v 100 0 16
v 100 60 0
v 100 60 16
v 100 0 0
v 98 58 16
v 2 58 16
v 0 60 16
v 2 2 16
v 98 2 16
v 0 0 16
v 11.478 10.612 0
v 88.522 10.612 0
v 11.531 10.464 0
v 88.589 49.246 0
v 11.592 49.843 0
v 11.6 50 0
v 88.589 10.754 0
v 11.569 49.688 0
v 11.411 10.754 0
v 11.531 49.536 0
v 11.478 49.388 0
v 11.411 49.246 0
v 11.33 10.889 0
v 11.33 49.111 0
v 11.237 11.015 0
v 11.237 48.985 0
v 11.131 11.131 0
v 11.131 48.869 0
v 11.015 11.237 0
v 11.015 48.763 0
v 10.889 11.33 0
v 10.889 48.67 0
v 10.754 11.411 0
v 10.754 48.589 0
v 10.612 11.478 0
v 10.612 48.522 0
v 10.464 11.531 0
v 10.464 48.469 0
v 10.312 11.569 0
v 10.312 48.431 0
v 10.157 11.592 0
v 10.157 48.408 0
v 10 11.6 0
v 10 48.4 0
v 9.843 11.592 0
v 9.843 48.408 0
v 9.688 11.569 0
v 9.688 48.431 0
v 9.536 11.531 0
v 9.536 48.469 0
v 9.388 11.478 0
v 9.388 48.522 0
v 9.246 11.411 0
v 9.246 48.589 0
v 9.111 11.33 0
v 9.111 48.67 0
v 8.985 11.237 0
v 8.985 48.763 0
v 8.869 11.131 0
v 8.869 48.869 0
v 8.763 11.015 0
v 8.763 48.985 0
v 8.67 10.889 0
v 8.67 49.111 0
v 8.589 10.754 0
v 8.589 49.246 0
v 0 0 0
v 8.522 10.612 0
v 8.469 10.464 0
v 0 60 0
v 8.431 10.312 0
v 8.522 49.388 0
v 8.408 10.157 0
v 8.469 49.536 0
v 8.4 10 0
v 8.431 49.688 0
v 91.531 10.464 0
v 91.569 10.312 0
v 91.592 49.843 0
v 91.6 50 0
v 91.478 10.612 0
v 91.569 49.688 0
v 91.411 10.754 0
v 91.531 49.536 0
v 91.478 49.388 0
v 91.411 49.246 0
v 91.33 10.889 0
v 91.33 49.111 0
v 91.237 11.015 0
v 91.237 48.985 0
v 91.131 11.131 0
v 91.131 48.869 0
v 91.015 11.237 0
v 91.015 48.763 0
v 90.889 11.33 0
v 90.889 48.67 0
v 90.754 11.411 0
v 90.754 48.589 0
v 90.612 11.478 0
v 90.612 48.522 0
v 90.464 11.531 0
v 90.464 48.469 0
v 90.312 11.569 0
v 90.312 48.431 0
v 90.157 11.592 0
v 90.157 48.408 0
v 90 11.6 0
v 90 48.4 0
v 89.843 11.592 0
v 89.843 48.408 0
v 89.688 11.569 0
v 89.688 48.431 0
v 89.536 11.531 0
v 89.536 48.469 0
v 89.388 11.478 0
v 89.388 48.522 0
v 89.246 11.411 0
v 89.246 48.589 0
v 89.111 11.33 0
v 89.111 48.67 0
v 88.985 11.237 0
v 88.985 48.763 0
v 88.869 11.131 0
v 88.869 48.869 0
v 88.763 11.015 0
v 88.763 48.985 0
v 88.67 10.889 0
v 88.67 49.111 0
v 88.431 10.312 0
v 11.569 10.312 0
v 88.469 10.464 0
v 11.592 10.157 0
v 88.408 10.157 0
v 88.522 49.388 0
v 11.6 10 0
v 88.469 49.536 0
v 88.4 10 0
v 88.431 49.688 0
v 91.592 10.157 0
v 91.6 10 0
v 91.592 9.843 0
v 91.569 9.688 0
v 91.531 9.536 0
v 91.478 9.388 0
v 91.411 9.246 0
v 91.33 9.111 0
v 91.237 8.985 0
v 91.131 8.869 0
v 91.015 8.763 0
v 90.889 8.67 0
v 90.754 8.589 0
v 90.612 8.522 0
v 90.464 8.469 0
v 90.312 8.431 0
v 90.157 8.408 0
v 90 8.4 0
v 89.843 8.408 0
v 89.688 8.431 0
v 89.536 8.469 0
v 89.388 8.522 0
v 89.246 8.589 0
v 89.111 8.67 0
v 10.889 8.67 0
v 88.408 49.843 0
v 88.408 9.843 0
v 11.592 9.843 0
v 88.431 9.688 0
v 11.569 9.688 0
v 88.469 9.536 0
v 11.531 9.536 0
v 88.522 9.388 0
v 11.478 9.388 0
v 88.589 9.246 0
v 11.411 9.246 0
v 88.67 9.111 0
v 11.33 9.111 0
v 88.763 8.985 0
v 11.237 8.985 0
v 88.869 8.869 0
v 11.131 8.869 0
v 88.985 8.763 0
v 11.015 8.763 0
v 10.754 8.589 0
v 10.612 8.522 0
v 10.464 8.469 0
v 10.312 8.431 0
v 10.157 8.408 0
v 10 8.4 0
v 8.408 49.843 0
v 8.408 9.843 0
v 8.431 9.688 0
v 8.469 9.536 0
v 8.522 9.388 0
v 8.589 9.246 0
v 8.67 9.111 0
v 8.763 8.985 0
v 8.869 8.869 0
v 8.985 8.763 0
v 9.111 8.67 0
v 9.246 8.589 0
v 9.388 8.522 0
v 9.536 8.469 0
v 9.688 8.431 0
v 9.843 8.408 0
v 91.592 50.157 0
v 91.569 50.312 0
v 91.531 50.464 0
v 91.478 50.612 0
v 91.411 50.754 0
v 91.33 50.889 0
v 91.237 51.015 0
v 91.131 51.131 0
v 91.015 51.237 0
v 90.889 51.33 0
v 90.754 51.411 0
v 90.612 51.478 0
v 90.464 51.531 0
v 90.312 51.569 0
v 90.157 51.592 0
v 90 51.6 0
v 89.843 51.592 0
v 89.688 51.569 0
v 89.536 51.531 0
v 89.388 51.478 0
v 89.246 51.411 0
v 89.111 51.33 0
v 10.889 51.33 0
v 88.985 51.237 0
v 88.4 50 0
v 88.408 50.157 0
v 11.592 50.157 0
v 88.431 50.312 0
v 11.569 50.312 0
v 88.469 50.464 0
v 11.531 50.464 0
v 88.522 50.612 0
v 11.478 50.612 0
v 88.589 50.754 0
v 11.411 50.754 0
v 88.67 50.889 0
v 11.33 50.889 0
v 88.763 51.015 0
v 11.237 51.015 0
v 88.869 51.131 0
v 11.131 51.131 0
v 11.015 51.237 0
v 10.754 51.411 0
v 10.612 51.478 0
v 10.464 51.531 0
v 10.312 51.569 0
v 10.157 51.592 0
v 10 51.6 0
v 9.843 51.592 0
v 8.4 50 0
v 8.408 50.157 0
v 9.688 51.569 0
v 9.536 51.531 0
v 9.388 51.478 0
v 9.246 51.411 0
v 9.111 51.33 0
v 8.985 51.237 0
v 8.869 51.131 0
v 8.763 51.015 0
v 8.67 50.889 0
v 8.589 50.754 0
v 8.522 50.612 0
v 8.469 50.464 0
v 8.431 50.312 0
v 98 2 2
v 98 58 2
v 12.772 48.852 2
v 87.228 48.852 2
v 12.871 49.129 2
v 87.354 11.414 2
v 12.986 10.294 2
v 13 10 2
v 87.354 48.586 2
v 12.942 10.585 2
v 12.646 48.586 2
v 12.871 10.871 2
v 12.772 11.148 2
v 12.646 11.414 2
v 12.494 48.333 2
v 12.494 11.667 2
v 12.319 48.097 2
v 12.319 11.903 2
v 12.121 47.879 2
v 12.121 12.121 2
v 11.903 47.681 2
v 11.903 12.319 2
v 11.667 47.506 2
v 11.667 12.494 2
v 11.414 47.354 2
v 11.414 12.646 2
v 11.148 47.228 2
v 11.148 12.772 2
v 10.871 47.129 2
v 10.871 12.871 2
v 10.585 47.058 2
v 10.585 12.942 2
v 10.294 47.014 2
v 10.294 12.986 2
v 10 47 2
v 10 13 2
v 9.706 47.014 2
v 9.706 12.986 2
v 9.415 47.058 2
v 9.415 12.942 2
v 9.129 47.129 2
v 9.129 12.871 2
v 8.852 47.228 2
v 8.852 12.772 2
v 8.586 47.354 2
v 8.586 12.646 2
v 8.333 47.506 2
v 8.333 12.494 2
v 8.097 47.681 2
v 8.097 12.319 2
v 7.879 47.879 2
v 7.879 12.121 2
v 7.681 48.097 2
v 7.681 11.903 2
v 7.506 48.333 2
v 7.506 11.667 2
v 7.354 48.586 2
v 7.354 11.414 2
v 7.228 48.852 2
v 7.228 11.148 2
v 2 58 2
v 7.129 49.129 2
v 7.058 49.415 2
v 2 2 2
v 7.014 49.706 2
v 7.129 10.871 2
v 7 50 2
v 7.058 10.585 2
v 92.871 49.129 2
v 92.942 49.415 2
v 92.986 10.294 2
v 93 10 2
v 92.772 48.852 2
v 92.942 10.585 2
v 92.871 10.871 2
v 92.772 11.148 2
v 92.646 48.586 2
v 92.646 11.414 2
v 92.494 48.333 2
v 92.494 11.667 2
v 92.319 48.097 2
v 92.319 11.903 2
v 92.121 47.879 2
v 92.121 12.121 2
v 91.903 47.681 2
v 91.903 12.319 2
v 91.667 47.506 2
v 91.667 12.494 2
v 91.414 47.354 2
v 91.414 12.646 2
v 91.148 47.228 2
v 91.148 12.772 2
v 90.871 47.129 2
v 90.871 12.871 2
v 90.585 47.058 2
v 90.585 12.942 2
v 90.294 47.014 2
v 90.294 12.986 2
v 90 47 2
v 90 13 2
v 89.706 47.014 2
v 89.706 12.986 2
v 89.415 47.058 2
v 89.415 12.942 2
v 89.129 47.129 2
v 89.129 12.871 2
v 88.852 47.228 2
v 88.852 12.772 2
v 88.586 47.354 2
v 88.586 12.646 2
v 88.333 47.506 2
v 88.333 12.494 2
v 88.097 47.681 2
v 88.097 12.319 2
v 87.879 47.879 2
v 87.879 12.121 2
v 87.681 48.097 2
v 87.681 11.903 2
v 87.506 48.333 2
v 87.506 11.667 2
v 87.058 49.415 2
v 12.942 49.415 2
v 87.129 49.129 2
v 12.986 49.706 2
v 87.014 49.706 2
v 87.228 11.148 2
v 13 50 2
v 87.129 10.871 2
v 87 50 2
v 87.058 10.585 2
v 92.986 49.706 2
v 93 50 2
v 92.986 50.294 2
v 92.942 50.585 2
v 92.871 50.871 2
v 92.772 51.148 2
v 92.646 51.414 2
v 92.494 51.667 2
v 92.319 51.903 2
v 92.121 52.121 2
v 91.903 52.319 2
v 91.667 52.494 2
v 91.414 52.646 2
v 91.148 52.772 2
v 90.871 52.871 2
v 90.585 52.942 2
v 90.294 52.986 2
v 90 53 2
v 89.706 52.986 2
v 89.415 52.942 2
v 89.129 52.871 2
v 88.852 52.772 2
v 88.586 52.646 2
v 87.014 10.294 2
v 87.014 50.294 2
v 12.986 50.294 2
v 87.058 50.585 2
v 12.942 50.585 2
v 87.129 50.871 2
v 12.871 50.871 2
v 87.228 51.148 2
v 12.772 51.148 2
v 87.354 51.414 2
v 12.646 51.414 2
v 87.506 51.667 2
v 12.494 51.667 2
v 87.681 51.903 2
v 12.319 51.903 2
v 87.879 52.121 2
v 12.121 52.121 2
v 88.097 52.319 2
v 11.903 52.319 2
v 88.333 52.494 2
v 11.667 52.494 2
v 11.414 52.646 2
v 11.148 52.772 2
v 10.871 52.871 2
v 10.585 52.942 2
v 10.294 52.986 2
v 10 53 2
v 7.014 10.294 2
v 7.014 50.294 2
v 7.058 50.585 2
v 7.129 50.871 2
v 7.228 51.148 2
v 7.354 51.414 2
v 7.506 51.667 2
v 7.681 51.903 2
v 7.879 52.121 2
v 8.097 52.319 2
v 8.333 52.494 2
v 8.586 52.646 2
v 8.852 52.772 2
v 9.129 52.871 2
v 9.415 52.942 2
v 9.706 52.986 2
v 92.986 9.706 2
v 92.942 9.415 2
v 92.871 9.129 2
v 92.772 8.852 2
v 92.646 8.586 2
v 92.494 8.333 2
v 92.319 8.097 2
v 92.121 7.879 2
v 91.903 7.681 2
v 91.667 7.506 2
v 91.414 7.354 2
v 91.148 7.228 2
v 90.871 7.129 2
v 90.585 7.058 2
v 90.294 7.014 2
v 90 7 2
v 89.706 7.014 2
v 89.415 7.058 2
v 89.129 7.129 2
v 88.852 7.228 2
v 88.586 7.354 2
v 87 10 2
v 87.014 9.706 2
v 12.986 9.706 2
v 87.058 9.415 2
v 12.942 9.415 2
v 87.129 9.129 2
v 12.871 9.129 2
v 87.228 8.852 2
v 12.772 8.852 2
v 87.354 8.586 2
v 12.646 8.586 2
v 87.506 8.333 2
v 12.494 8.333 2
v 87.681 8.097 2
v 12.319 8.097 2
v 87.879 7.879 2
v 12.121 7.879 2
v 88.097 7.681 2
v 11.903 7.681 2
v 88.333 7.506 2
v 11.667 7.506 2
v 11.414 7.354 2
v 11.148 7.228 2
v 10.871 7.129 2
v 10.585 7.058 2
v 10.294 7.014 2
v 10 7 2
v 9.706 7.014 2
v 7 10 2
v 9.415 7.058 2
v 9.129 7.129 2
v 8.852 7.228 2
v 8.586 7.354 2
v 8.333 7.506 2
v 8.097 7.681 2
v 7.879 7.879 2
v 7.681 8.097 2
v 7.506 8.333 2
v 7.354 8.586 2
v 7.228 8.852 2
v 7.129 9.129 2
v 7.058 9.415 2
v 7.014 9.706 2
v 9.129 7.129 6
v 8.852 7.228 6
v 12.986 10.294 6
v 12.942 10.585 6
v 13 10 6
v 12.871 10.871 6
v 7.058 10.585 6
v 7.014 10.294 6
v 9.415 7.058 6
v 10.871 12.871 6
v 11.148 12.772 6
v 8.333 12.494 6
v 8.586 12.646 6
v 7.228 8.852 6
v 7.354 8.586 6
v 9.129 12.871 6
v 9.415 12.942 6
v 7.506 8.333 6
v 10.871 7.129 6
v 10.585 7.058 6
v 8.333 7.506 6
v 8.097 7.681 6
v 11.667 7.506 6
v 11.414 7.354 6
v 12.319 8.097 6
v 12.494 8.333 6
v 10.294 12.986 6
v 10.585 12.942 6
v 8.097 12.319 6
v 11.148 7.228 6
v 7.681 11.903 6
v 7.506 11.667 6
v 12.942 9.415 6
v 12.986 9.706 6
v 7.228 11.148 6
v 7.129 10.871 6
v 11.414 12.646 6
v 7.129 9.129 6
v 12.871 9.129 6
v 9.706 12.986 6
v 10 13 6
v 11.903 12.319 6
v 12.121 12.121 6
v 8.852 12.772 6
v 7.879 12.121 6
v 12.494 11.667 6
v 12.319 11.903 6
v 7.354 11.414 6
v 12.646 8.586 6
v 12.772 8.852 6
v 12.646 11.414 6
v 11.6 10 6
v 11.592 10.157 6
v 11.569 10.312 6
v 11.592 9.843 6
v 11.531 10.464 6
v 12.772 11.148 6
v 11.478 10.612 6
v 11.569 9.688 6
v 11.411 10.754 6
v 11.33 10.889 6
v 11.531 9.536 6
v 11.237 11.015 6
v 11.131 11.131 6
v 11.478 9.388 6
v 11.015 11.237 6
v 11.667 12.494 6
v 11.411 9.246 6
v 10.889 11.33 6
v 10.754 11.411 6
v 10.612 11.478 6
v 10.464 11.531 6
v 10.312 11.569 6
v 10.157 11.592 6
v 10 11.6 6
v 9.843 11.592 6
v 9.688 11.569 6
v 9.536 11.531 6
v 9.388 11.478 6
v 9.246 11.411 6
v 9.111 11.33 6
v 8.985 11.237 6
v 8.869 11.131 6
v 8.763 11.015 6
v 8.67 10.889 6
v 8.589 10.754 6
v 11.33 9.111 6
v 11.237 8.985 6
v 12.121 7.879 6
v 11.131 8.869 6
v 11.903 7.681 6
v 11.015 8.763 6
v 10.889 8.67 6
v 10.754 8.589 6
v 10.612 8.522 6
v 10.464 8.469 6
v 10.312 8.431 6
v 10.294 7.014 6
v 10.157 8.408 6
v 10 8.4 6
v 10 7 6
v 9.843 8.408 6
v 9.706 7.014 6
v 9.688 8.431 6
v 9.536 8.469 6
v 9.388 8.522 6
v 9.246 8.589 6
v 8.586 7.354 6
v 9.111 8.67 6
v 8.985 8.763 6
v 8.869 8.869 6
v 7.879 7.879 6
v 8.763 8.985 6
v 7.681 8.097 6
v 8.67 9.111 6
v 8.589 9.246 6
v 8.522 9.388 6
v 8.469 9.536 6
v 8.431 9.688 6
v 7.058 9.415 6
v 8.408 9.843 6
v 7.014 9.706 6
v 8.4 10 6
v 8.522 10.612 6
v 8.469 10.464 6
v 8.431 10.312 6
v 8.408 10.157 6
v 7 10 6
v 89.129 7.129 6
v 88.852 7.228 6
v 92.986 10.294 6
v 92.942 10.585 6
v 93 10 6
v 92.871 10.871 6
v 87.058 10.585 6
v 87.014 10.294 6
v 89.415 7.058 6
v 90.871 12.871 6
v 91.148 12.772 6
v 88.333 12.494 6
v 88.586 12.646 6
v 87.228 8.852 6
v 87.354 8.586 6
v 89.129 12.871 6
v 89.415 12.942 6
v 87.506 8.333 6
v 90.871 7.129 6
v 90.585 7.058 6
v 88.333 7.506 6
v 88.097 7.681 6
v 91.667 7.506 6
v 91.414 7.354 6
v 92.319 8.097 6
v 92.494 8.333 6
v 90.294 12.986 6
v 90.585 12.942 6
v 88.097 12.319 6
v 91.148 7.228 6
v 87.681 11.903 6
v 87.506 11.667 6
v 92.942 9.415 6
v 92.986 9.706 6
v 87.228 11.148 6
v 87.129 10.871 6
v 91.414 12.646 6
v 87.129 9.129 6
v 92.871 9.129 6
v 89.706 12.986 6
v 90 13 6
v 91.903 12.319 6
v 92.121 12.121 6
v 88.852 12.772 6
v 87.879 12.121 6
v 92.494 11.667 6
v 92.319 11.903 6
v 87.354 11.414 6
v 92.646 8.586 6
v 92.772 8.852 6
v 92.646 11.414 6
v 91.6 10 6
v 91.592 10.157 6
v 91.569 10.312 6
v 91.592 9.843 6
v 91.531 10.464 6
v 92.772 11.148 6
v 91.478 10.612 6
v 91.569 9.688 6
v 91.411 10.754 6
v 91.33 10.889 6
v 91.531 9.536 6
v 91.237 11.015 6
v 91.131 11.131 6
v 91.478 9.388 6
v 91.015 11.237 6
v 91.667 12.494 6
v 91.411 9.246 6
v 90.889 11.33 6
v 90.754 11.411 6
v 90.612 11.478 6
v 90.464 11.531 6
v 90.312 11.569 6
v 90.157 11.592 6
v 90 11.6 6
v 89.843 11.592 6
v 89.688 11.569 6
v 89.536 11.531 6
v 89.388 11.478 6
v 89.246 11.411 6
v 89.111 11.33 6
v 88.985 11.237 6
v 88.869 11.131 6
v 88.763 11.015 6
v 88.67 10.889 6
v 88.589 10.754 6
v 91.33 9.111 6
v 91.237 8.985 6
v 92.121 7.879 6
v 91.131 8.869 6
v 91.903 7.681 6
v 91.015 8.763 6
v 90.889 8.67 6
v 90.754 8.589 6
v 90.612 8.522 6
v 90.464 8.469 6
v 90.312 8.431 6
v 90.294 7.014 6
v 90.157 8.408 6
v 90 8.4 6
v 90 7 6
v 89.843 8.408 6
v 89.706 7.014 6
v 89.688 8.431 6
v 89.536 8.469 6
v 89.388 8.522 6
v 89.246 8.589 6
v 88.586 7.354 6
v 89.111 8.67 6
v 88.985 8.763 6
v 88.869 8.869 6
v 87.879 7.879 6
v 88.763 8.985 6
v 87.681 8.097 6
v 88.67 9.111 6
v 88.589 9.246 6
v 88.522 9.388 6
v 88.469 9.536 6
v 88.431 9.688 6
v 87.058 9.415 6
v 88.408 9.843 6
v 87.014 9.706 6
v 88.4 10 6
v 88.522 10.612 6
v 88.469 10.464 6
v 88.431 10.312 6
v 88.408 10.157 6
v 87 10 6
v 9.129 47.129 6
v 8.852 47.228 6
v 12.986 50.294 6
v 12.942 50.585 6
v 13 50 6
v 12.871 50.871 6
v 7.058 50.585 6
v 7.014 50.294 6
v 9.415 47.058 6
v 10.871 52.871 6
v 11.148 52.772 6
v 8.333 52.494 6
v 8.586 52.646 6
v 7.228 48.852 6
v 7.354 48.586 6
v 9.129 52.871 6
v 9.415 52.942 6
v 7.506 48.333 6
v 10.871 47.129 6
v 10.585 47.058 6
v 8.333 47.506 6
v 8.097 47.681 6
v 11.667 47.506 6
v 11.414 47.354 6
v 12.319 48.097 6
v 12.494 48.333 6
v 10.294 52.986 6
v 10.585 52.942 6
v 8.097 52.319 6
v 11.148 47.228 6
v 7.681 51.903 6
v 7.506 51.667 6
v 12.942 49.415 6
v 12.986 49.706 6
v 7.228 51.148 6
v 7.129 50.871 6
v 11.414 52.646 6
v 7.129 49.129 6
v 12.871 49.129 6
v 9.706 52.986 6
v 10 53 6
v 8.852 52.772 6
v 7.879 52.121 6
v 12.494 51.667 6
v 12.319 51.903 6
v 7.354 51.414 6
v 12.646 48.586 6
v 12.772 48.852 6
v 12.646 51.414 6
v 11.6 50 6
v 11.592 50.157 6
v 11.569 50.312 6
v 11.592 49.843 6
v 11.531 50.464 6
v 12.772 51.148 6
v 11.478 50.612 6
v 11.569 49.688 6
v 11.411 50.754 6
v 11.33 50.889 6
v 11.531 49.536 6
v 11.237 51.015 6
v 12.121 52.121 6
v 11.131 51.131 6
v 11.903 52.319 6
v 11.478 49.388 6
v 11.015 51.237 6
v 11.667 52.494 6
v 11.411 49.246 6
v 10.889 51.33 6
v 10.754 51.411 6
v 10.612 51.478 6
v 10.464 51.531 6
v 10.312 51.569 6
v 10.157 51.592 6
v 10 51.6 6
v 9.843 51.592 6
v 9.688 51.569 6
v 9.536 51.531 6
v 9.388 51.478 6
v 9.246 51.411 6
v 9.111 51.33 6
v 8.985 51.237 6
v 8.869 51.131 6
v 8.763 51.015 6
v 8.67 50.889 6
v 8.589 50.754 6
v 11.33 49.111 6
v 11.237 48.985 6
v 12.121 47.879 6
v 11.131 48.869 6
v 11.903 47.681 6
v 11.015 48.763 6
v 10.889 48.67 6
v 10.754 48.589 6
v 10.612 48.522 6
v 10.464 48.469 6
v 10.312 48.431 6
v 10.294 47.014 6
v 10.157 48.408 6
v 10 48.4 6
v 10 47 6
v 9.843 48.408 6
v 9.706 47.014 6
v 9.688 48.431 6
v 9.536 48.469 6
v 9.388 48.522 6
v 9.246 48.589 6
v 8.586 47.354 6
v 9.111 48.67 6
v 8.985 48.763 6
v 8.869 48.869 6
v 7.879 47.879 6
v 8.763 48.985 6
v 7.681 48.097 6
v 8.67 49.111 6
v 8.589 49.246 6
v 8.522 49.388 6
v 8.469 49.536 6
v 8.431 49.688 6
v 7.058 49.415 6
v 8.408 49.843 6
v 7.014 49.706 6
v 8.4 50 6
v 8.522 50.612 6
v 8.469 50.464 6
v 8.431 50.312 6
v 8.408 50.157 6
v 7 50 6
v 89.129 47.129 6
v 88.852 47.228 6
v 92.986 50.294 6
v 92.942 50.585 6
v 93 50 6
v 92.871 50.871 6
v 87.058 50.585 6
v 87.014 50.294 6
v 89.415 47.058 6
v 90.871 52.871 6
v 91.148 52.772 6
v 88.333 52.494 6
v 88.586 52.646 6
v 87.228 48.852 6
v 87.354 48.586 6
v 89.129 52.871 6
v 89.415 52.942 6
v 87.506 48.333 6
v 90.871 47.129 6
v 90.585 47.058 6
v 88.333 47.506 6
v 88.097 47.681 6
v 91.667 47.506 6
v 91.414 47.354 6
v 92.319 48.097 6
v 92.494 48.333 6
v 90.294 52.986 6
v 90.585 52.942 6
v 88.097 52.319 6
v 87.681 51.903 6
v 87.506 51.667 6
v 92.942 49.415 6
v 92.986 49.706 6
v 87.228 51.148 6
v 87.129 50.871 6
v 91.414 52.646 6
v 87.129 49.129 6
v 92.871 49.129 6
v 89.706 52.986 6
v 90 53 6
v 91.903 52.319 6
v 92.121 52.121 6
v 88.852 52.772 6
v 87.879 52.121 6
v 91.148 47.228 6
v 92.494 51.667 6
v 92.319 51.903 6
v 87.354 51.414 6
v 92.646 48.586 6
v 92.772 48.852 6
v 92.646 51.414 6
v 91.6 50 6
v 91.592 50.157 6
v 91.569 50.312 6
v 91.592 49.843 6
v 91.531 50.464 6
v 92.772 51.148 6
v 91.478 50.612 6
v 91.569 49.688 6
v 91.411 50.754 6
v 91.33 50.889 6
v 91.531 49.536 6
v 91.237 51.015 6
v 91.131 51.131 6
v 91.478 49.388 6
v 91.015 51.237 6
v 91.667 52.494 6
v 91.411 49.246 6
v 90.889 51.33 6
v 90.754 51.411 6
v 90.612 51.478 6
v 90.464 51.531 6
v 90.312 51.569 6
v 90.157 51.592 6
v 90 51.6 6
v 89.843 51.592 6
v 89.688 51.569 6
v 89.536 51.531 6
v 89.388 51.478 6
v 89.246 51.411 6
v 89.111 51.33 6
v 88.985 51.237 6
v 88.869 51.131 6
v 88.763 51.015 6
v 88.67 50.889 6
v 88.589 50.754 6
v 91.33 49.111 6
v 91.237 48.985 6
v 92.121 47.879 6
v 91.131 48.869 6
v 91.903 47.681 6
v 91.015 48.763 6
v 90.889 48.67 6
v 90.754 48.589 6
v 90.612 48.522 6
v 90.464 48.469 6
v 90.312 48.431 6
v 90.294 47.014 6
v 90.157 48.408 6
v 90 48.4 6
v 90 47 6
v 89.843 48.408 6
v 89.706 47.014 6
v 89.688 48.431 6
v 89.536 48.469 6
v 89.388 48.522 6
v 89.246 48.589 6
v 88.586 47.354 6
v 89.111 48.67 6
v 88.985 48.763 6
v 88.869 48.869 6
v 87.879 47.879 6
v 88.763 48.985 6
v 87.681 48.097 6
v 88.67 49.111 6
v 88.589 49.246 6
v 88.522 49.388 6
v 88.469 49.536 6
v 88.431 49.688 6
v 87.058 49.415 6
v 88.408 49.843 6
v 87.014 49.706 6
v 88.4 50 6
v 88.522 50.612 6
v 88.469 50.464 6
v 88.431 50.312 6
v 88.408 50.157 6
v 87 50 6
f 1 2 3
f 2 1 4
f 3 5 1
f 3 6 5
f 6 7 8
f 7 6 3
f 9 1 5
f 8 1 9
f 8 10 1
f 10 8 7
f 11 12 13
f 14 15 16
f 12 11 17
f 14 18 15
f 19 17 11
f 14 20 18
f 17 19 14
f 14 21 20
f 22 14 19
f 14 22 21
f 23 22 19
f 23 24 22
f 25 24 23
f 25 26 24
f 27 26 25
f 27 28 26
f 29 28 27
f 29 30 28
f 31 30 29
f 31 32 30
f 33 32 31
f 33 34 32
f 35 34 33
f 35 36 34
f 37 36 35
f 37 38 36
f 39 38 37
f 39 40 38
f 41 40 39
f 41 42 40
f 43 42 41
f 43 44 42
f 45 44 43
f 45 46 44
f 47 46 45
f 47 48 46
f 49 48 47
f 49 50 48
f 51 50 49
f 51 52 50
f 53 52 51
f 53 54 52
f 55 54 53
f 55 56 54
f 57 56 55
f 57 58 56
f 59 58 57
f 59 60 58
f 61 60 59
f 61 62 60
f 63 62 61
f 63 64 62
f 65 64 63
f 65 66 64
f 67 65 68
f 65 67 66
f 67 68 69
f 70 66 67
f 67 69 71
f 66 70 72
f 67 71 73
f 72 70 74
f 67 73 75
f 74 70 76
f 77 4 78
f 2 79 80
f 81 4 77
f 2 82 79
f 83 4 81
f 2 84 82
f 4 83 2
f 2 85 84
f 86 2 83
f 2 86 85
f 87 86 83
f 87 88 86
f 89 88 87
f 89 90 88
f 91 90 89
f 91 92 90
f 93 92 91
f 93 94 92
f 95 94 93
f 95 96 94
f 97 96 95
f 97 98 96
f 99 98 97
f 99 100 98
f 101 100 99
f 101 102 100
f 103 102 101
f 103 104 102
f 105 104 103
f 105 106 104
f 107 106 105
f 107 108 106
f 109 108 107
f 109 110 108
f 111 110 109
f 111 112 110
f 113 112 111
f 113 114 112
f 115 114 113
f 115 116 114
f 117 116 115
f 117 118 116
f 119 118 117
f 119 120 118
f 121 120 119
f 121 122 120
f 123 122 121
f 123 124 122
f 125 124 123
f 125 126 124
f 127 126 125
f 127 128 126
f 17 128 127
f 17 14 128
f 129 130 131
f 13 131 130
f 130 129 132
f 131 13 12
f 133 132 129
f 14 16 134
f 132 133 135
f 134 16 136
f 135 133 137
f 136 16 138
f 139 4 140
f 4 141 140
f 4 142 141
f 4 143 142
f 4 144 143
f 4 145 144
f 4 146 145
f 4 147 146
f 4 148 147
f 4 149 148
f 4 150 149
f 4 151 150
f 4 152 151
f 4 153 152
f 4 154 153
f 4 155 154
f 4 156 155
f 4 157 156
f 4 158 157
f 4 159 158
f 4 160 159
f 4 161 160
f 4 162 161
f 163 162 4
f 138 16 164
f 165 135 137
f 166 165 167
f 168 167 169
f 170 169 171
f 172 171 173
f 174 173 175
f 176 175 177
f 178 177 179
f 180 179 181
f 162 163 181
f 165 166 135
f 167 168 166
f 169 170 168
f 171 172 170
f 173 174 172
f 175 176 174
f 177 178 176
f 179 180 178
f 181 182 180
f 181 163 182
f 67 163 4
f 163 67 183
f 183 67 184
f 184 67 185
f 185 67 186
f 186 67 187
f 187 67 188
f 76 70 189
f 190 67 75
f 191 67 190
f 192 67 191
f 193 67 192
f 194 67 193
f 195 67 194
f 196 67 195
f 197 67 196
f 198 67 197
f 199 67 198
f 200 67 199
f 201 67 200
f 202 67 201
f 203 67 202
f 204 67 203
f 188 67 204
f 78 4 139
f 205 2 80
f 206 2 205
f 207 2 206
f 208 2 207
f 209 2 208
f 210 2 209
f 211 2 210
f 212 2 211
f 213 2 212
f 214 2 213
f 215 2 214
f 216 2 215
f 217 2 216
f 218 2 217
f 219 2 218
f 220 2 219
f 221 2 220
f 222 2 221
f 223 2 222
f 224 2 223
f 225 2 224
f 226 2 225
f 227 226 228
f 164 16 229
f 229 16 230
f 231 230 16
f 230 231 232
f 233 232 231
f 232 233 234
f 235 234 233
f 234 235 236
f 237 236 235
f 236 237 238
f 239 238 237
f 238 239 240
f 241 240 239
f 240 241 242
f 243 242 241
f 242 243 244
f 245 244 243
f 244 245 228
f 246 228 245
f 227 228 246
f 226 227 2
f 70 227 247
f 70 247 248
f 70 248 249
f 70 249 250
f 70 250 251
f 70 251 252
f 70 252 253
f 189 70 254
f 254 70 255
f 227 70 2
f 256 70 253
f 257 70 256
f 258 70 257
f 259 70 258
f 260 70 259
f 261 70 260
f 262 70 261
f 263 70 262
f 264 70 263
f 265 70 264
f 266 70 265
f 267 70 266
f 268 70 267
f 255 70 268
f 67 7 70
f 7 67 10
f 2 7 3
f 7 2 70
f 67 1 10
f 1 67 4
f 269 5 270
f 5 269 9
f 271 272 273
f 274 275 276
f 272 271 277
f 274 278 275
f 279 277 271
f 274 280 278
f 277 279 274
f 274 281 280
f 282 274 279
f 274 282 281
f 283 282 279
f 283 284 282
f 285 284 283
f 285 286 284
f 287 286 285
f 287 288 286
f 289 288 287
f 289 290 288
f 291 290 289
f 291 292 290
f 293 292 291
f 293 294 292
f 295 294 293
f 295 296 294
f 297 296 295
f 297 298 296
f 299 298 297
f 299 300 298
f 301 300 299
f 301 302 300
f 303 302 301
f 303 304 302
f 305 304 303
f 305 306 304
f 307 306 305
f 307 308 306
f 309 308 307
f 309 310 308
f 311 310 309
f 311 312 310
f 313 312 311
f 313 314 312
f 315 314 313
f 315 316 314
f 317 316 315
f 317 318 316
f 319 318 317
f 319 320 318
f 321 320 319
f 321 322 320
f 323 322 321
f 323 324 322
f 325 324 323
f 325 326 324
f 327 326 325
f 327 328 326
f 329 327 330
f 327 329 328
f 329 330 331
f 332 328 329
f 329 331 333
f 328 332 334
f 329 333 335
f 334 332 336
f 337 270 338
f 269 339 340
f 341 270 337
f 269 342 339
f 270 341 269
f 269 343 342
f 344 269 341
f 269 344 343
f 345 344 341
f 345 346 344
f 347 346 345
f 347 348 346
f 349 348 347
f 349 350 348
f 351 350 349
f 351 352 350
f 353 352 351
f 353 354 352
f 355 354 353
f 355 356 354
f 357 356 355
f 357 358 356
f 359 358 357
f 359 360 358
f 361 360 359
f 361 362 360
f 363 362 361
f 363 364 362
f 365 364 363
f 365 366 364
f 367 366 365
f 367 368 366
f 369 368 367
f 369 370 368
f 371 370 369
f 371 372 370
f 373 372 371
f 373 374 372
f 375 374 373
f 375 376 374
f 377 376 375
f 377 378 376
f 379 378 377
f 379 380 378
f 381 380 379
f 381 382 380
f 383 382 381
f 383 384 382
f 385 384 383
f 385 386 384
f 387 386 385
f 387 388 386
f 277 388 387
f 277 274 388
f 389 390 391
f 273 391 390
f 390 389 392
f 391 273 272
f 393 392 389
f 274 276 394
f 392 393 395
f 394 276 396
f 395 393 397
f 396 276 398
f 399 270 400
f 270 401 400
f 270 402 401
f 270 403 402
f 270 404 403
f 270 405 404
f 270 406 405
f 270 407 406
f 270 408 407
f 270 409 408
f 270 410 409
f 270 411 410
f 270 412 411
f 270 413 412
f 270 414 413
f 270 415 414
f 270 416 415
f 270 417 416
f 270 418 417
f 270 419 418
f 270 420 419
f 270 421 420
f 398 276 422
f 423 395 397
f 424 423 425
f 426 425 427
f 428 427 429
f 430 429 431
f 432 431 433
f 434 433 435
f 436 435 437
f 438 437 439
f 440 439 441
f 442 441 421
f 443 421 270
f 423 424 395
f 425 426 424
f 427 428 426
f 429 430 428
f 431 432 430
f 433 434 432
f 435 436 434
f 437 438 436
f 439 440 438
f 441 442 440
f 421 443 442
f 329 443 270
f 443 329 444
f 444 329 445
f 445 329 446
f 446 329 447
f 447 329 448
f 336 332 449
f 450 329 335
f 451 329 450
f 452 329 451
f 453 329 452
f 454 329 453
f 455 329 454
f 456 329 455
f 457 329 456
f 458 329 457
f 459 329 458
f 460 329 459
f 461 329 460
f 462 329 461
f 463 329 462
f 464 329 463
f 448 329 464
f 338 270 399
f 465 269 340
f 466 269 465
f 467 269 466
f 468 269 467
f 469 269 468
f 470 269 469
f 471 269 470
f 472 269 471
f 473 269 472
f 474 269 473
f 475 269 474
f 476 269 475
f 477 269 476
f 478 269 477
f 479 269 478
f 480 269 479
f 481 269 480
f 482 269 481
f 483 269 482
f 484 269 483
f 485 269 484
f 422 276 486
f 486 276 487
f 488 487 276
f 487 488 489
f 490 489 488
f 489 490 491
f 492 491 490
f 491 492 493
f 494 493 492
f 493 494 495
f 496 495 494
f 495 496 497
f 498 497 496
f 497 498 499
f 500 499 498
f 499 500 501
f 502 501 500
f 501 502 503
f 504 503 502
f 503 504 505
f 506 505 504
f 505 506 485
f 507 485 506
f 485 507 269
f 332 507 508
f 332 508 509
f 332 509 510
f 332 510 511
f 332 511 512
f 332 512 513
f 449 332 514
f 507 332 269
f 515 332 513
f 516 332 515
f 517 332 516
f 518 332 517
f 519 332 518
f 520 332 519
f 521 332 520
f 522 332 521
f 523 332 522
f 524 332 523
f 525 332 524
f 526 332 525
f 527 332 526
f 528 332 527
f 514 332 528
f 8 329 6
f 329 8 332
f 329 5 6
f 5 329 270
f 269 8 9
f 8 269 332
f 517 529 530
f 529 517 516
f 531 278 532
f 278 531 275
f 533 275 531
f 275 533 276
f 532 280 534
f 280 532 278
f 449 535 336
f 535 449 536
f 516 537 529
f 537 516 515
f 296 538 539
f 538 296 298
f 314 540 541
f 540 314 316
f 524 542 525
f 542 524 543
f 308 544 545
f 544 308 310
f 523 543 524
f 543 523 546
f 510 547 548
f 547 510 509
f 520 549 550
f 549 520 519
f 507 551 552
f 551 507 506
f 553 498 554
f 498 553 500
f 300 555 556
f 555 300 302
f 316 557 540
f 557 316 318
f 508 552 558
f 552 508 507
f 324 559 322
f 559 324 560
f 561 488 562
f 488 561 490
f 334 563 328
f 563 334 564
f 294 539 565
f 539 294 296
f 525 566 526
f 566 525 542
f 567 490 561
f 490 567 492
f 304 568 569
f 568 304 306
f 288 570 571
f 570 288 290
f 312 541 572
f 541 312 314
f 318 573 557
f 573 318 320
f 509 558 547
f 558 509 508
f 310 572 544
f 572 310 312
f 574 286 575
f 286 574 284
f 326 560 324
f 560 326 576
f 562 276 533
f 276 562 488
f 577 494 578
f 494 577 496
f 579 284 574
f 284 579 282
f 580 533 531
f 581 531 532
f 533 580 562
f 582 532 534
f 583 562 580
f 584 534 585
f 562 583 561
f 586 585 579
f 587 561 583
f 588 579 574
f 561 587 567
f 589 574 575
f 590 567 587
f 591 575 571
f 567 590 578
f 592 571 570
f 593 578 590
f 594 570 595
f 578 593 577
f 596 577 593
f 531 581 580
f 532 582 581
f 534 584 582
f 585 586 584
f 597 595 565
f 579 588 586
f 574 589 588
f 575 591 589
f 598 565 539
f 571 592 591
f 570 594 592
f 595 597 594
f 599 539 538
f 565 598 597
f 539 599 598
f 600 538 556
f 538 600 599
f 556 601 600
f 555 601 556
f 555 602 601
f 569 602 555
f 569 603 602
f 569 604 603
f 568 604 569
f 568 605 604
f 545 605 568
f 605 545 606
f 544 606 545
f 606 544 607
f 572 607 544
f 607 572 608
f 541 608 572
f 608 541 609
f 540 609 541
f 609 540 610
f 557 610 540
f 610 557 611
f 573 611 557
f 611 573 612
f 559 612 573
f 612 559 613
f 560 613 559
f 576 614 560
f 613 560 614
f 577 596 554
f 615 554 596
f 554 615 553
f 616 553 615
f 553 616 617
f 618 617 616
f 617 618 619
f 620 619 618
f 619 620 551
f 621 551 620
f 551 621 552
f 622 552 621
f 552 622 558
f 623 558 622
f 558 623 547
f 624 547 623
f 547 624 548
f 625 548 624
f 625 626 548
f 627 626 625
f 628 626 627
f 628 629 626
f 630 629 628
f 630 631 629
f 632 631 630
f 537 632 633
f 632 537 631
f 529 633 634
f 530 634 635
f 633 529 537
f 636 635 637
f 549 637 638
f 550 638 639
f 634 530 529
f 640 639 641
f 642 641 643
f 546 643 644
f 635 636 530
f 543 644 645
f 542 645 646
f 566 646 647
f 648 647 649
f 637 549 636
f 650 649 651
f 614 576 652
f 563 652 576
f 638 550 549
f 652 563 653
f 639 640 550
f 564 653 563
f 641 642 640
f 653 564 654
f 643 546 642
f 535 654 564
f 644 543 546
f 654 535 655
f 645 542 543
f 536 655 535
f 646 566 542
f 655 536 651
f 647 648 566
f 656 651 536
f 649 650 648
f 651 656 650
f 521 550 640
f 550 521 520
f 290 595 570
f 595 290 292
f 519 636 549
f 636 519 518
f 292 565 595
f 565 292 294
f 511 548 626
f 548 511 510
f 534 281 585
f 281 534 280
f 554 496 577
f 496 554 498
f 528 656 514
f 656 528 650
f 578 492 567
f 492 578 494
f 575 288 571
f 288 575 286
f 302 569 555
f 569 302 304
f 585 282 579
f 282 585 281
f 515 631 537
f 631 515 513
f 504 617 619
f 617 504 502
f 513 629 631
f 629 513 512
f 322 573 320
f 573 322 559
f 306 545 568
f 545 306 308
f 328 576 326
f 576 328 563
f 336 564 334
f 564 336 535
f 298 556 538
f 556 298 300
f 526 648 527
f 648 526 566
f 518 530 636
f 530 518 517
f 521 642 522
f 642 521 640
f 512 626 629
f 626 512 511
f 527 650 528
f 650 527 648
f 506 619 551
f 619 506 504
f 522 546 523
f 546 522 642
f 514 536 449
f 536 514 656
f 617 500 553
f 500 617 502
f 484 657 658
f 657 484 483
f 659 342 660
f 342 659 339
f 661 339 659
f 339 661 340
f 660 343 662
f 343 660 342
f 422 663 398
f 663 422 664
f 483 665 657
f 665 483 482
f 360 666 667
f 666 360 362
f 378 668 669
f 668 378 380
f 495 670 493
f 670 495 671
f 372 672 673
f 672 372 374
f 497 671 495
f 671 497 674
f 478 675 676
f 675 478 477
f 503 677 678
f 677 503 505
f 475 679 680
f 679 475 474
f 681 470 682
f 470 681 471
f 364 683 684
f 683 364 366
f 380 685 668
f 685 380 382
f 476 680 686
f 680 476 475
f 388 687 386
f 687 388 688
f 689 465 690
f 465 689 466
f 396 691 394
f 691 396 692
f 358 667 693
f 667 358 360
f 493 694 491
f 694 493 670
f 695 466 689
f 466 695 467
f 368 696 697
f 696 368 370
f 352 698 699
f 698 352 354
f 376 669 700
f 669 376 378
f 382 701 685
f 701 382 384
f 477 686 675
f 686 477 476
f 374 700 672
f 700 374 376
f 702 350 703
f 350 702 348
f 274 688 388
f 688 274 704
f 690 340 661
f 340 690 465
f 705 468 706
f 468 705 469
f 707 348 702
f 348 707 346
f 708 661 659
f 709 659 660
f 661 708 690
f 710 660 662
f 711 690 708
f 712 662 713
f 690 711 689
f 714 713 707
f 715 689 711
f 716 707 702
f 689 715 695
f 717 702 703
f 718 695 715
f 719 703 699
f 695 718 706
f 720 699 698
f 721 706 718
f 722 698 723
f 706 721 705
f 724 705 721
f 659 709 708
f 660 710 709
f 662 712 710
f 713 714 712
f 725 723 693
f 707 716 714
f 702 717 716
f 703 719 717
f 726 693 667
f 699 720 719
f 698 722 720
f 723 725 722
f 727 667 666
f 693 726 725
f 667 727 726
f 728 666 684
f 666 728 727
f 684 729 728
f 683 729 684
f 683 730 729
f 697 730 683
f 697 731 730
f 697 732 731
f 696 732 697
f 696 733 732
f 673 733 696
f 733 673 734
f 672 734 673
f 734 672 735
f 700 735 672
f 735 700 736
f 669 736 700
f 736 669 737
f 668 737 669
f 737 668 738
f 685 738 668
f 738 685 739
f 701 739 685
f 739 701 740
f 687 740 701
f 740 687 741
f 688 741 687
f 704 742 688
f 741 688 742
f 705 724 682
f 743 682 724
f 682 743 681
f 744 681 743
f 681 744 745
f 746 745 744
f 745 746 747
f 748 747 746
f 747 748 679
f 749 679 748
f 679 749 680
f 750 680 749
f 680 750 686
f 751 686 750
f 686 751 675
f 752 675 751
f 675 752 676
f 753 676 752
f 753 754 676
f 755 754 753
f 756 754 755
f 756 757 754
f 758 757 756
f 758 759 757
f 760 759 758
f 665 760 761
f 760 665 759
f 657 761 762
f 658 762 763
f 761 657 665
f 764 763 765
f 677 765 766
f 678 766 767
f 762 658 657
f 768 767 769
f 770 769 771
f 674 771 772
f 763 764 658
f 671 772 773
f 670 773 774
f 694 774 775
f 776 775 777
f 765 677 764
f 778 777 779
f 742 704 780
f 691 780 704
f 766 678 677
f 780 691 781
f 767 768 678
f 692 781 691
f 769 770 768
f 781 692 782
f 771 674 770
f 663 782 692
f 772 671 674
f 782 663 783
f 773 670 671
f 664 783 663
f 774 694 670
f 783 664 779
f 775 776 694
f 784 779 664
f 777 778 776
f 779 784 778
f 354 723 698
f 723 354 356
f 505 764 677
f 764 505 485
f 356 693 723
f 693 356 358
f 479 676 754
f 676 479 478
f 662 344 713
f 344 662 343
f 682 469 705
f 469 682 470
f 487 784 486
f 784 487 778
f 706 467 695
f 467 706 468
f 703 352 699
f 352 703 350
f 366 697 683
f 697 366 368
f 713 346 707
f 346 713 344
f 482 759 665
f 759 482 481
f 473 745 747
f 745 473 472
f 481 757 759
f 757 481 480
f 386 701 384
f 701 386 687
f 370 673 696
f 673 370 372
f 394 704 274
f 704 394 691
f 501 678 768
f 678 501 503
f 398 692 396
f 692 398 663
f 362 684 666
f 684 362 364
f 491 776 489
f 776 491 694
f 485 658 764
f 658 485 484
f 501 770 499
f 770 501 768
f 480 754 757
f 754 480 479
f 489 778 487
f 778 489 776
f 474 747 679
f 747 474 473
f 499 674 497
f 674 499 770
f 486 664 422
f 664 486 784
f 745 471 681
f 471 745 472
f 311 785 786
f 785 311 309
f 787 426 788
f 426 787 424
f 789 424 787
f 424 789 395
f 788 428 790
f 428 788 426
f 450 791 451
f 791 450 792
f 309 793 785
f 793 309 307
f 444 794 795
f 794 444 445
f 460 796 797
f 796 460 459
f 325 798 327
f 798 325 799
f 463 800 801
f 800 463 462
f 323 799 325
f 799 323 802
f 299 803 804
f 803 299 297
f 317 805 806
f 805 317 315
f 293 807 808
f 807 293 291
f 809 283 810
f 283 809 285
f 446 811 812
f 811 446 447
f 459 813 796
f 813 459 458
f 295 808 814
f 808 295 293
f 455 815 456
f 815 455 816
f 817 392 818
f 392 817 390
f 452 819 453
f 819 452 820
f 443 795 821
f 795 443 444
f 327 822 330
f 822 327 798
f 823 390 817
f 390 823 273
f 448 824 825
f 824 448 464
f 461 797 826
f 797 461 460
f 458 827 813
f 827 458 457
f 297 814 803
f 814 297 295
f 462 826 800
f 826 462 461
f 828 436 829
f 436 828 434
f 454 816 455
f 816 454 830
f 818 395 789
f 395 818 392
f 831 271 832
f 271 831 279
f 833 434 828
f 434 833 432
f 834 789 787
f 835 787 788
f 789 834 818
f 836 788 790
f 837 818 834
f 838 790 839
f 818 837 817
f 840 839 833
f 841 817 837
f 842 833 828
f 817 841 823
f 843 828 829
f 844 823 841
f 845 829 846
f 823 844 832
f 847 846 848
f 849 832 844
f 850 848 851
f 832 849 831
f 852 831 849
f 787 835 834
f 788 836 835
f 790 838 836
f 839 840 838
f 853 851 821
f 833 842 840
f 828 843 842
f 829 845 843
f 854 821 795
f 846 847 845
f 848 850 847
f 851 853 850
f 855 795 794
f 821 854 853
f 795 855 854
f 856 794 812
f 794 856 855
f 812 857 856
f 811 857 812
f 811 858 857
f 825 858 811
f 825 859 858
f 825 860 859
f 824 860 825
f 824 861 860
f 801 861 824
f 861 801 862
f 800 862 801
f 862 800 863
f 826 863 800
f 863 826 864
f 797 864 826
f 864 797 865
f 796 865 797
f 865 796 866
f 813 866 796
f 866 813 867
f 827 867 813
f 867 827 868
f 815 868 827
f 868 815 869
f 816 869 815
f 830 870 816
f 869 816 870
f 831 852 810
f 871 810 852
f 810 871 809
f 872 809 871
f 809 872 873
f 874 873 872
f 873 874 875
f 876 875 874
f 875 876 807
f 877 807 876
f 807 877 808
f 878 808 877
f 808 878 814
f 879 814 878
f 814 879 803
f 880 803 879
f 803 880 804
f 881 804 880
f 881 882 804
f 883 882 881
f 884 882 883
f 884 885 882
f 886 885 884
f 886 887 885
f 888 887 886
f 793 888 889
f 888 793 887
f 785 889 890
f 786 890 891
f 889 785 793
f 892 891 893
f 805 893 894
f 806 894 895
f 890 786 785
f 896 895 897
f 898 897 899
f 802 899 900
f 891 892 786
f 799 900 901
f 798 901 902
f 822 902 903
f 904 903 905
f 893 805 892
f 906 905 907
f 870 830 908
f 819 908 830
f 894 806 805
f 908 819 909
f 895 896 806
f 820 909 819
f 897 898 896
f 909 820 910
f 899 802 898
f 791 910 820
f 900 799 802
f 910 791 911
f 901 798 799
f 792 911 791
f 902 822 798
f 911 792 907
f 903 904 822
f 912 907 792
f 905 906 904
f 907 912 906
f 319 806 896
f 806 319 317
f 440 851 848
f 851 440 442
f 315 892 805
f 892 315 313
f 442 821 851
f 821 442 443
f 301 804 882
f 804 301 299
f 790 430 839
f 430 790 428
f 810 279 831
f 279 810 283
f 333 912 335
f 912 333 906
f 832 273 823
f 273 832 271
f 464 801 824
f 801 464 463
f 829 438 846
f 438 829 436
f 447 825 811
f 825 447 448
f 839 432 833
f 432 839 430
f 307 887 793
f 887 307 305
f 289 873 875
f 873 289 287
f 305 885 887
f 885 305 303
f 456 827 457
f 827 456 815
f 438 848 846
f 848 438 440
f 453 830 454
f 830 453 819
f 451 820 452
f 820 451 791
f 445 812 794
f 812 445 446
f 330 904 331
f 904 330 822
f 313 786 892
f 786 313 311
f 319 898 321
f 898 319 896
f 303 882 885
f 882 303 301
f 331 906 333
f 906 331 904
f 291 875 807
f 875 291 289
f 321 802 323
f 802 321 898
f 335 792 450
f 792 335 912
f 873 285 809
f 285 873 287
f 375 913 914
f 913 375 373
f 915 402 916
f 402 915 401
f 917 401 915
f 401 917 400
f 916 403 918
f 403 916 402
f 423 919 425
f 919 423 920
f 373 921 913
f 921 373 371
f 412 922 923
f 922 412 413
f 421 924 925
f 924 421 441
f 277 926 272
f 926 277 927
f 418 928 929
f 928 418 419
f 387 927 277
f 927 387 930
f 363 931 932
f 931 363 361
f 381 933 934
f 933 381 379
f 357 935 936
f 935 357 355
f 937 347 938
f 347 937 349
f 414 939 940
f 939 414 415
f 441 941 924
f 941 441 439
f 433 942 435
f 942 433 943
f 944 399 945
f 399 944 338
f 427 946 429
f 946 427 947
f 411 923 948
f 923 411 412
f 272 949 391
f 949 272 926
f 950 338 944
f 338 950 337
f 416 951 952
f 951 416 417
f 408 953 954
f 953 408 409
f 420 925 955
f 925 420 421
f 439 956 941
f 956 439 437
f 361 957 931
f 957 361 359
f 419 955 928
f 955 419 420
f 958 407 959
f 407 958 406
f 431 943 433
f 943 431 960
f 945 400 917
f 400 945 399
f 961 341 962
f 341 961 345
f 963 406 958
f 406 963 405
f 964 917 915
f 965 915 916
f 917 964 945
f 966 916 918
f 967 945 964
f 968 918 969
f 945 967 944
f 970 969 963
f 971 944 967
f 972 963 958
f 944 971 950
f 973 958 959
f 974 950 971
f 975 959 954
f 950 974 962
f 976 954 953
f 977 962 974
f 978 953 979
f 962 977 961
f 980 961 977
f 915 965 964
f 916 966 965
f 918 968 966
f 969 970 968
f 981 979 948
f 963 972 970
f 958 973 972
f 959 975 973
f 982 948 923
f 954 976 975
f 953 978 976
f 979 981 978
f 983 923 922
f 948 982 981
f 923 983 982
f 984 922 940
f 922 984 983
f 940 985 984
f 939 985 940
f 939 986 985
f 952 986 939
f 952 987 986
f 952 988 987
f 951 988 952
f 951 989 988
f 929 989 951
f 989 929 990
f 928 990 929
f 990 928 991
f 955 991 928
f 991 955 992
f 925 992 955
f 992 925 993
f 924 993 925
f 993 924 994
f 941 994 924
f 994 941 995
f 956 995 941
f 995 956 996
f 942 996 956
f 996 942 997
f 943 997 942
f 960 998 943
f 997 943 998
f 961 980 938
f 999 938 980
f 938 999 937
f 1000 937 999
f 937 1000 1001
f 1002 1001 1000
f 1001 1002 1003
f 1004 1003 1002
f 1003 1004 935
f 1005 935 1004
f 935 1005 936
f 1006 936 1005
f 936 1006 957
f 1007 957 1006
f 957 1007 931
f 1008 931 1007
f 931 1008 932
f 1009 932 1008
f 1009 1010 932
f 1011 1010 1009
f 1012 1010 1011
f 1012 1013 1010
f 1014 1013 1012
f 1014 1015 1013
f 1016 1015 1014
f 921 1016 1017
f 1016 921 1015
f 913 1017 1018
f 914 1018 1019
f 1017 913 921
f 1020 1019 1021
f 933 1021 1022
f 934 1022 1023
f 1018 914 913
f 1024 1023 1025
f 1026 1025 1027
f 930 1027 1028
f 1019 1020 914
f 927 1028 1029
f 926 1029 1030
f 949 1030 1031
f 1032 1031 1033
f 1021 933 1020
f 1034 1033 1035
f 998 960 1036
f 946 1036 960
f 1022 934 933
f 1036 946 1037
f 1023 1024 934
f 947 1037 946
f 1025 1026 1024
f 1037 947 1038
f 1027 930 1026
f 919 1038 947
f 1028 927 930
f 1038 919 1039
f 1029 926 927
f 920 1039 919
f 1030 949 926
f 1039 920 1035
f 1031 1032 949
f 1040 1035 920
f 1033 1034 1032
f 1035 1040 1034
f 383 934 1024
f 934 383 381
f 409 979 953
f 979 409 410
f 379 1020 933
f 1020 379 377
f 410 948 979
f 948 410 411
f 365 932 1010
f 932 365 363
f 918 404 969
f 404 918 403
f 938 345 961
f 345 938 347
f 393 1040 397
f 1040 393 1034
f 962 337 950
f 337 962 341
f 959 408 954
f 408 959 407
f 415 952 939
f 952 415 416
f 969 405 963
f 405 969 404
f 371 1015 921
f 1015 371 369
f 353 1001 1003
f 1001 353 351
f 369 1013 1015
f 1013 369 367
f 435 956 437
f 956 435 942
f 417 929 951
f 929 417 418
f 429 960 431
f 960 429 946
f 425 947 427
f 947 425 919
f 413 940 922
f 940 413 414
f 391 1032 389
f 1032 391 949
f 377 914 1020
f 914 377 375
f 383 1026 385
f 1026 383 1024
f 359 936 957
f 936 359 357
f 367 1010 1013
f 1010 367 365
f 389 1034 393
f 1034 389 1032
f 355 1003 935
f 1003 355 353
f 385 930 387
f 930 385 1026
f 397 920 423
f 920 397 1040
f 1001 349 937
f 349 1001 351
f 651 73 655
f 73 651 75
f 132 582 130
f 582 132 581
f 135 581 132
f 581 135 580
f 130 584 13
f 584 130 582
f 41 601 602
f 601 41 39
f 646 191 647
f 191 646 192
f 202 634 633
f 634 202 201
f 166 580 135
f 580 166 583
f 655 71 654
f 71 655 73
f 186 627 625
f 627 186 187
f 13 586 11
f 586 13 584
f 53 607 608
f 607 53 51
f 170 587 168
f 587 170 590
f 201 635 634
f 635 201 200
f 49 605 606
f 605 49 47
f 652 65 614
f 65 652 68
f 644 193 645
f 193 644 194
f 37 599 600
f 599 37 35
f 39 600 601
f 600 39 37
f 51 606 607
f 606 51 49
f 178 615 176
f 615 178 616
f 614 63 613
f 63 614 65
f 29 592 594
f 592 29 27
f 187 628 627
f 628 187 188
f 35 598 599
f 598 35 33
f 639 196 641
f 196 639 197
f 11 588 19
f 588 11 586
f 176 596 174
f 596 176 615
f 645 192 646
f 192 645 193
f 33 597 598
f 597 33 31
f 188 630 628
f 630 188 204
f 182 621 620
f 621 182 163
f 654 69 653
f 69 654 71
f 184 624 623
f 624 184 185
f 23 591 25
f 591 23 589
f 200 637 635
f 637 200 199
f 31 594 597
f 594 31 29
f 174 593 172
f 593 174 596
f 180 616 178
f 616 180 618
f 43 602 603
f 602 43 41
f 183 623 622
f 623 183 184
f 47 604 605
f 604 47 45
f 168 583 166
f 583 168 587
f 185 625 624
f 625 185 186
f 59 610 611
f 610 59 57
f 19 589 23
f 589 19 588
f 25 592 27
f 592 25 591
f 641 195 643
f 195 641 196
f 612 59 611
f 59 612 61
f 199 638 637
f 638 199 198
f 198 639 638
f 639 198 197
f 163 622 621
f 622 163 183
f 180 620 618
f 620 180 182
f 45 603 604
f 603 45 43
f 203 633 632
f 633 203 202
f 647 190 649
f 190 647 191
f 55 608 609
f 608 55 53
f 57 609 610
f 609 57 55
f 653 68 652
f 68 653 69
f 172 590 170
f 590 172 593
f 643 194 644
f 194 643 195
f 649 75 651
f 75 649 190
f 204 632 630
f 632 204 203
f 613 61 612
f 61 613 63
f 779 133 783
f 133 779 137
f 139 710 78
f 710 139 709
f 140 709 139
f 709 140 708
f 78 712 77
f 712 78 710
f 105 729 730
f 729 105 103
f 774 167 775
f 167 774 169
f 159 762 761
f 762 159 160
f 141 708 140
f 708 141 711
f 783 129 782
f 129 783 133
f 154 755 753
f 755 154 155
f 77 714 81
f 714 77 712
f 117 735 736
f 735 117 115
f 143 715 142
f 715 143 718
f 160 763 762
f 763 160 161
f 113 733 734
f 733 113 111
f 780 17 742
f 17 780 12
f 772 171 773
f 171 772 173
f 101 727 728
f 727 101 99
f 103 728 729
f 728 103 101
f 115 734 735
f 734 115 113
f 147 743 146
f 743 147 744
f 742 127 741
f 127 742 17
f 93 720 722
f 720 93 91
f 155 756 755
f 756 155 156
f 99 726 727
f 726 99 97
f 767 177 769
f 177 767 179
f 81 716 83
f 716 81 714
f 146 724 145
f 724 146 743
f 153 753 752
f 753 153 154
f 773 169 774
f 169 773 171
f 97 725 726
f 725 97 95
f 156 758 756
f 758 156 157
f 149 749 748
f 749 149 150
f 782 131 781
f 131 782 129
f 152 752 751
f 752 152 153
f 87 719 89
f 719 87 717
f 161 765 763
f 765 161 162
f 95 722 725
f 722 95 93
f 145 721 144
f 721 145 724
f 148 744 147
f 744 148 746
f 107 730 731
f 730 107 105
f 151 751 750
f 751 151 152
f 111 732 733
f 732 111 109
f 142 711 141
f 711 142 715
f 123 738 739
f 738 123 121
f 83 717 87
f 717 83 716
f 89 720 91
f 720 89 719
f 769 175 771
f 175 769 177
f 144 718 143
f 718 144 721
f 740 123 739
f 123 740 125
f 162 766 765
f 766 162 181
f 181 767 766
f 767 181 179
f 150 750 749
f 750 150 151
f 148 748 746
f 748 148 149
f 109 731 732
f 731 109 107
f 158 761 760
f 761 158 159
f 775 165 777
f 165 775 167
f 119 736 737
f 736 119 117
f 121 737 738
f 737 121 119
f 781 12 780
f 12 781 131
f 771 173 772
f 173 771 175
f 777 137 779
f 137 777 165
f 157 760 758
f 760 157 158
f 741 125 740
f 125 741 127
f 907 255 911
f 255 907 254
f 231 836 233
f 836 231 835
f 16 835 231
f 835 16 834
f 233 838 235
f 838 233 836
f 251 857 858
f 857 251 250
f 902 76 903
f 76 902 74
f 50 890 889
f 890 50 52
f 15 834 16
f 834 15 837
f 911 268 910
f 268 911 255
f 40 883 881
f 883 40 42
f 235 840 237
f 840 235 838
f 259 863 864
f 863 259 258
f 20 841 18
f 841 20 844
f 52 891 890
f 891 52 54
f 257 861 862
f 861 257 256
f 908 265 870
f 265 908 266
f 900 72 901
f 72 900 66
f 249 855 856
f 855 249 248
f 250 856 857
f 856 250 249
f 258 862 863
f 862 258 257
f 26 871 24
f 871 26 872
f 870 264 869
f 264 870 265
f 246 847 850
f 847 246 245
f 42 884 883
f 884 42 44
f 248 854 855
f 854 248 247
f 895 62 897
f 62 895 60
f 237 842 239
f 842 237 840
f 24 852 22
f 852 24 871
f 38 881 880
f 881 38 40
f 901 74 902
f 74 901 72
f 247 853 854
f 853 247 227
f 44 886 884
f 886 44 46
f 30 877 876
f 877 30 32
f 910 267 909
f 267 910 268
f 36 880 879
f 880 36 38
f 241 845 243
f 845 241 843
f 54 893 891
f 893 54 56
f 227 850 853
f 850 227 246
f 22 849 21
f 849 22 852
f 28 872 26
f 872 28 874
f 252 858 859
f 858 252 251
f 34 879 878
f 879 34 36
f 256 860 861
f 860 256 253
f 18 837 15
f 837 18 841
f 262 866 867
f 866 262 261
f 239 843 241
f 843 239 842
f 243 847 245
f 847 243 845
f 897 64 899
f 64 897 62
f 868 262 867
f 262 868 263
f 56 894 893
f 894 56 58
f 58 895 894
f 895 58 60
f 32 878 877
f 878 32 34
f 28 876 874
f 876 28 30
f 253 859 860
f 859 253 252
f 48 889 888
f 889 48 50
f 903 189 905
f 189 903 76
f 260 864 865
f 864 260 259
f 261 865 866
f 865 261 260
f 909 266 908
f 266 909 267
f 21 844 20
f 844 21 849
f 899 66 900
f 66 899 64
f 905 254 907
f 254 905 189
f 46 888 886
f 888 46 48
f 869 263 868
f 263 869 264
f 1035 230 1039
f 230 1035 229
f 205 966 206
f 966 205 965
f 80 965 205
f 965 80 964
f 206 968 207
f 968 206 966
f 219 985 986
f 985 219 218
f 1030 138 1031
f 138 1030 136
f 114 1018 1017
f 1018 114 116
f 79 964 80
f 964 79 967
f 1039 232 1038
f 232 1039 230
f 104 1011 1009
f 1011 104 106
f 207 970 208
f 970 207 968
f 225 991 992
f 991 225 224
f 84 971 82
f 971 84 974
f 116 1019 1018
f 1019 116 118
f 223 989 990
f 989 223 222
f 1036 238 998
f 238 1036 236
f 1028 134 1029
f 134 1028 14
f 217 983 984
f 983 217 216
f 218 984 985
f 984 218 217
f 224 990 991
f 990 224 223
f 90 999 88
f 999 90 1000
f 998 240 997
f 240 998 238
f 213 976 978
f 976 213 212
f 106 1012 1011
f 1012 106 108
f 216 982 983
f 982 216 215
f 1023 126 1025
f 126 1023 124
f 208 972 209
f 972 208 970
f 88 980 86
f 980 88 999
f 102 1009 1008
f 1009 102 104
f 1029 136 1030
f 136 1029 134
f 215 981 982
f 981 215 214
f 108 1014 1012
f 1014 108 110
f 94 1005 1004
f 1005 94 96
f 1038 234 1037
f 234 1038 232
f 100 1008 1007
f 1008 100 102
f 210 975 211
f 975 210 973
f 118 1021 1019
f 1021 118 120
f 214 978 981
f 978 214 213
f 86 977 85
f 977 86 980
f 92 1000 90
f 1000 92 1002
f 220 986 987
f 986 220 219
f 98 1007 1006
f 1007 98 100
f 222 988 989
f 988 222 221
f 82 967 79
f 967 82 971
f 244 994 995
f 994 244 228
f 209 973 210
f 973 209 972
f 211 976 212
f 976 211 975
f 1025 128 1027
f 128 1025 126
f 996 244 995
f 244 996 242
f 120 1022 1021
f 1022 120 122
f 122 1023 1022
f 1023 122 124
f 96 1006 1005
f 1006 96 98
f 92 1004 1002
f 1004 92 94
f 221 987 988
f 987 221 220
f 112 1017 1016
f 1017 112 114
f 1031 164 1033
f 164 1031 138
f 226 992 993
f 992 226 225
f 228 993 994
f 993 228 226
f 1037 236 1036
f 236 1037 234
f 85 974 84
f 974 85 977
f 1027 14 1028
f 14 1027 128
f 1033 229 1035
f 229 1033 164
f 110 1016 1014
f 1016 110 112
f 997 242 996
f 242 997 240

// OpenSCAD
// 合成装配示例，单位 mm。原点在底盒外部左前下角，开口朝 +Z。
// 侧壁向内增厚；底板、孔轴、支柱顶面和 PCB 的装配位置固定。
part = "base";             // [base,lid,pcb,assembly]
wall = 2;
outer_xy = [100, 60];
base_height = 16;
floor_thickness = 2;
lid_thickness = 2;
hole_centers = [[10,10], [90,10], [10,50], [90,50]];
hole_diameter = 3.2;
boss_diameter = 6;
board_origin = [5,5,6];
board_size = [90,50,1.6];
cut_extra = 0.2;
$fn = 64;

module bores(centers, bottom, height) {
    for (p = centers)
        translate([p.x, p.y, bottom - cut_extra])
            cylinder(h = height + 2*cut_extra, d = hole_diameter);
}

module base(thickness = wall, centers = hole_centers) {
    assert(thickness > 0 && 2*thickness < min(outer_xy));
    difference() {
        union() {
            difference() {
                cube([outer_xy.x, outer_xy.y, base_height]);
                translate([thickness, thickness, floor_thickness])
                    cube([outer_xy.x-2*thickness, outer_xy.y-2*thickness, base_height]);
            }
            for (p = hole_centers)
                translate([p.x, p.y, 0]) cylinder(h = board_origin.z, d = boss_diameter);
        }
        bores(centers, 0, base_height);
    }
}

module lid() {
    difference() {
        cube([outer_xy.x, outer_xy.y, lid_thickness]);
        bores(hole_centers, 0, lid_thickness);
    }
}

module pcb() {
    difference() {
        translate(board_origin) cube(board_size);
        bores(hole_centers, board_origin.z, board_size.z);
    }
}

if (part == "base") base(wall);
else if (part == "lid") lid();
else if (part == "pcb") pcb();
else if (part == "assembly") {
    base(wall);
    color("green") pcb();
    color("silver", 0.5) translate([0,0,base_height]) lid();
} else assert(false, str("unknown part: ", part));

// 仓库根目录运行 python scripts/verify_assembly.py --wall 3 --out evidence
